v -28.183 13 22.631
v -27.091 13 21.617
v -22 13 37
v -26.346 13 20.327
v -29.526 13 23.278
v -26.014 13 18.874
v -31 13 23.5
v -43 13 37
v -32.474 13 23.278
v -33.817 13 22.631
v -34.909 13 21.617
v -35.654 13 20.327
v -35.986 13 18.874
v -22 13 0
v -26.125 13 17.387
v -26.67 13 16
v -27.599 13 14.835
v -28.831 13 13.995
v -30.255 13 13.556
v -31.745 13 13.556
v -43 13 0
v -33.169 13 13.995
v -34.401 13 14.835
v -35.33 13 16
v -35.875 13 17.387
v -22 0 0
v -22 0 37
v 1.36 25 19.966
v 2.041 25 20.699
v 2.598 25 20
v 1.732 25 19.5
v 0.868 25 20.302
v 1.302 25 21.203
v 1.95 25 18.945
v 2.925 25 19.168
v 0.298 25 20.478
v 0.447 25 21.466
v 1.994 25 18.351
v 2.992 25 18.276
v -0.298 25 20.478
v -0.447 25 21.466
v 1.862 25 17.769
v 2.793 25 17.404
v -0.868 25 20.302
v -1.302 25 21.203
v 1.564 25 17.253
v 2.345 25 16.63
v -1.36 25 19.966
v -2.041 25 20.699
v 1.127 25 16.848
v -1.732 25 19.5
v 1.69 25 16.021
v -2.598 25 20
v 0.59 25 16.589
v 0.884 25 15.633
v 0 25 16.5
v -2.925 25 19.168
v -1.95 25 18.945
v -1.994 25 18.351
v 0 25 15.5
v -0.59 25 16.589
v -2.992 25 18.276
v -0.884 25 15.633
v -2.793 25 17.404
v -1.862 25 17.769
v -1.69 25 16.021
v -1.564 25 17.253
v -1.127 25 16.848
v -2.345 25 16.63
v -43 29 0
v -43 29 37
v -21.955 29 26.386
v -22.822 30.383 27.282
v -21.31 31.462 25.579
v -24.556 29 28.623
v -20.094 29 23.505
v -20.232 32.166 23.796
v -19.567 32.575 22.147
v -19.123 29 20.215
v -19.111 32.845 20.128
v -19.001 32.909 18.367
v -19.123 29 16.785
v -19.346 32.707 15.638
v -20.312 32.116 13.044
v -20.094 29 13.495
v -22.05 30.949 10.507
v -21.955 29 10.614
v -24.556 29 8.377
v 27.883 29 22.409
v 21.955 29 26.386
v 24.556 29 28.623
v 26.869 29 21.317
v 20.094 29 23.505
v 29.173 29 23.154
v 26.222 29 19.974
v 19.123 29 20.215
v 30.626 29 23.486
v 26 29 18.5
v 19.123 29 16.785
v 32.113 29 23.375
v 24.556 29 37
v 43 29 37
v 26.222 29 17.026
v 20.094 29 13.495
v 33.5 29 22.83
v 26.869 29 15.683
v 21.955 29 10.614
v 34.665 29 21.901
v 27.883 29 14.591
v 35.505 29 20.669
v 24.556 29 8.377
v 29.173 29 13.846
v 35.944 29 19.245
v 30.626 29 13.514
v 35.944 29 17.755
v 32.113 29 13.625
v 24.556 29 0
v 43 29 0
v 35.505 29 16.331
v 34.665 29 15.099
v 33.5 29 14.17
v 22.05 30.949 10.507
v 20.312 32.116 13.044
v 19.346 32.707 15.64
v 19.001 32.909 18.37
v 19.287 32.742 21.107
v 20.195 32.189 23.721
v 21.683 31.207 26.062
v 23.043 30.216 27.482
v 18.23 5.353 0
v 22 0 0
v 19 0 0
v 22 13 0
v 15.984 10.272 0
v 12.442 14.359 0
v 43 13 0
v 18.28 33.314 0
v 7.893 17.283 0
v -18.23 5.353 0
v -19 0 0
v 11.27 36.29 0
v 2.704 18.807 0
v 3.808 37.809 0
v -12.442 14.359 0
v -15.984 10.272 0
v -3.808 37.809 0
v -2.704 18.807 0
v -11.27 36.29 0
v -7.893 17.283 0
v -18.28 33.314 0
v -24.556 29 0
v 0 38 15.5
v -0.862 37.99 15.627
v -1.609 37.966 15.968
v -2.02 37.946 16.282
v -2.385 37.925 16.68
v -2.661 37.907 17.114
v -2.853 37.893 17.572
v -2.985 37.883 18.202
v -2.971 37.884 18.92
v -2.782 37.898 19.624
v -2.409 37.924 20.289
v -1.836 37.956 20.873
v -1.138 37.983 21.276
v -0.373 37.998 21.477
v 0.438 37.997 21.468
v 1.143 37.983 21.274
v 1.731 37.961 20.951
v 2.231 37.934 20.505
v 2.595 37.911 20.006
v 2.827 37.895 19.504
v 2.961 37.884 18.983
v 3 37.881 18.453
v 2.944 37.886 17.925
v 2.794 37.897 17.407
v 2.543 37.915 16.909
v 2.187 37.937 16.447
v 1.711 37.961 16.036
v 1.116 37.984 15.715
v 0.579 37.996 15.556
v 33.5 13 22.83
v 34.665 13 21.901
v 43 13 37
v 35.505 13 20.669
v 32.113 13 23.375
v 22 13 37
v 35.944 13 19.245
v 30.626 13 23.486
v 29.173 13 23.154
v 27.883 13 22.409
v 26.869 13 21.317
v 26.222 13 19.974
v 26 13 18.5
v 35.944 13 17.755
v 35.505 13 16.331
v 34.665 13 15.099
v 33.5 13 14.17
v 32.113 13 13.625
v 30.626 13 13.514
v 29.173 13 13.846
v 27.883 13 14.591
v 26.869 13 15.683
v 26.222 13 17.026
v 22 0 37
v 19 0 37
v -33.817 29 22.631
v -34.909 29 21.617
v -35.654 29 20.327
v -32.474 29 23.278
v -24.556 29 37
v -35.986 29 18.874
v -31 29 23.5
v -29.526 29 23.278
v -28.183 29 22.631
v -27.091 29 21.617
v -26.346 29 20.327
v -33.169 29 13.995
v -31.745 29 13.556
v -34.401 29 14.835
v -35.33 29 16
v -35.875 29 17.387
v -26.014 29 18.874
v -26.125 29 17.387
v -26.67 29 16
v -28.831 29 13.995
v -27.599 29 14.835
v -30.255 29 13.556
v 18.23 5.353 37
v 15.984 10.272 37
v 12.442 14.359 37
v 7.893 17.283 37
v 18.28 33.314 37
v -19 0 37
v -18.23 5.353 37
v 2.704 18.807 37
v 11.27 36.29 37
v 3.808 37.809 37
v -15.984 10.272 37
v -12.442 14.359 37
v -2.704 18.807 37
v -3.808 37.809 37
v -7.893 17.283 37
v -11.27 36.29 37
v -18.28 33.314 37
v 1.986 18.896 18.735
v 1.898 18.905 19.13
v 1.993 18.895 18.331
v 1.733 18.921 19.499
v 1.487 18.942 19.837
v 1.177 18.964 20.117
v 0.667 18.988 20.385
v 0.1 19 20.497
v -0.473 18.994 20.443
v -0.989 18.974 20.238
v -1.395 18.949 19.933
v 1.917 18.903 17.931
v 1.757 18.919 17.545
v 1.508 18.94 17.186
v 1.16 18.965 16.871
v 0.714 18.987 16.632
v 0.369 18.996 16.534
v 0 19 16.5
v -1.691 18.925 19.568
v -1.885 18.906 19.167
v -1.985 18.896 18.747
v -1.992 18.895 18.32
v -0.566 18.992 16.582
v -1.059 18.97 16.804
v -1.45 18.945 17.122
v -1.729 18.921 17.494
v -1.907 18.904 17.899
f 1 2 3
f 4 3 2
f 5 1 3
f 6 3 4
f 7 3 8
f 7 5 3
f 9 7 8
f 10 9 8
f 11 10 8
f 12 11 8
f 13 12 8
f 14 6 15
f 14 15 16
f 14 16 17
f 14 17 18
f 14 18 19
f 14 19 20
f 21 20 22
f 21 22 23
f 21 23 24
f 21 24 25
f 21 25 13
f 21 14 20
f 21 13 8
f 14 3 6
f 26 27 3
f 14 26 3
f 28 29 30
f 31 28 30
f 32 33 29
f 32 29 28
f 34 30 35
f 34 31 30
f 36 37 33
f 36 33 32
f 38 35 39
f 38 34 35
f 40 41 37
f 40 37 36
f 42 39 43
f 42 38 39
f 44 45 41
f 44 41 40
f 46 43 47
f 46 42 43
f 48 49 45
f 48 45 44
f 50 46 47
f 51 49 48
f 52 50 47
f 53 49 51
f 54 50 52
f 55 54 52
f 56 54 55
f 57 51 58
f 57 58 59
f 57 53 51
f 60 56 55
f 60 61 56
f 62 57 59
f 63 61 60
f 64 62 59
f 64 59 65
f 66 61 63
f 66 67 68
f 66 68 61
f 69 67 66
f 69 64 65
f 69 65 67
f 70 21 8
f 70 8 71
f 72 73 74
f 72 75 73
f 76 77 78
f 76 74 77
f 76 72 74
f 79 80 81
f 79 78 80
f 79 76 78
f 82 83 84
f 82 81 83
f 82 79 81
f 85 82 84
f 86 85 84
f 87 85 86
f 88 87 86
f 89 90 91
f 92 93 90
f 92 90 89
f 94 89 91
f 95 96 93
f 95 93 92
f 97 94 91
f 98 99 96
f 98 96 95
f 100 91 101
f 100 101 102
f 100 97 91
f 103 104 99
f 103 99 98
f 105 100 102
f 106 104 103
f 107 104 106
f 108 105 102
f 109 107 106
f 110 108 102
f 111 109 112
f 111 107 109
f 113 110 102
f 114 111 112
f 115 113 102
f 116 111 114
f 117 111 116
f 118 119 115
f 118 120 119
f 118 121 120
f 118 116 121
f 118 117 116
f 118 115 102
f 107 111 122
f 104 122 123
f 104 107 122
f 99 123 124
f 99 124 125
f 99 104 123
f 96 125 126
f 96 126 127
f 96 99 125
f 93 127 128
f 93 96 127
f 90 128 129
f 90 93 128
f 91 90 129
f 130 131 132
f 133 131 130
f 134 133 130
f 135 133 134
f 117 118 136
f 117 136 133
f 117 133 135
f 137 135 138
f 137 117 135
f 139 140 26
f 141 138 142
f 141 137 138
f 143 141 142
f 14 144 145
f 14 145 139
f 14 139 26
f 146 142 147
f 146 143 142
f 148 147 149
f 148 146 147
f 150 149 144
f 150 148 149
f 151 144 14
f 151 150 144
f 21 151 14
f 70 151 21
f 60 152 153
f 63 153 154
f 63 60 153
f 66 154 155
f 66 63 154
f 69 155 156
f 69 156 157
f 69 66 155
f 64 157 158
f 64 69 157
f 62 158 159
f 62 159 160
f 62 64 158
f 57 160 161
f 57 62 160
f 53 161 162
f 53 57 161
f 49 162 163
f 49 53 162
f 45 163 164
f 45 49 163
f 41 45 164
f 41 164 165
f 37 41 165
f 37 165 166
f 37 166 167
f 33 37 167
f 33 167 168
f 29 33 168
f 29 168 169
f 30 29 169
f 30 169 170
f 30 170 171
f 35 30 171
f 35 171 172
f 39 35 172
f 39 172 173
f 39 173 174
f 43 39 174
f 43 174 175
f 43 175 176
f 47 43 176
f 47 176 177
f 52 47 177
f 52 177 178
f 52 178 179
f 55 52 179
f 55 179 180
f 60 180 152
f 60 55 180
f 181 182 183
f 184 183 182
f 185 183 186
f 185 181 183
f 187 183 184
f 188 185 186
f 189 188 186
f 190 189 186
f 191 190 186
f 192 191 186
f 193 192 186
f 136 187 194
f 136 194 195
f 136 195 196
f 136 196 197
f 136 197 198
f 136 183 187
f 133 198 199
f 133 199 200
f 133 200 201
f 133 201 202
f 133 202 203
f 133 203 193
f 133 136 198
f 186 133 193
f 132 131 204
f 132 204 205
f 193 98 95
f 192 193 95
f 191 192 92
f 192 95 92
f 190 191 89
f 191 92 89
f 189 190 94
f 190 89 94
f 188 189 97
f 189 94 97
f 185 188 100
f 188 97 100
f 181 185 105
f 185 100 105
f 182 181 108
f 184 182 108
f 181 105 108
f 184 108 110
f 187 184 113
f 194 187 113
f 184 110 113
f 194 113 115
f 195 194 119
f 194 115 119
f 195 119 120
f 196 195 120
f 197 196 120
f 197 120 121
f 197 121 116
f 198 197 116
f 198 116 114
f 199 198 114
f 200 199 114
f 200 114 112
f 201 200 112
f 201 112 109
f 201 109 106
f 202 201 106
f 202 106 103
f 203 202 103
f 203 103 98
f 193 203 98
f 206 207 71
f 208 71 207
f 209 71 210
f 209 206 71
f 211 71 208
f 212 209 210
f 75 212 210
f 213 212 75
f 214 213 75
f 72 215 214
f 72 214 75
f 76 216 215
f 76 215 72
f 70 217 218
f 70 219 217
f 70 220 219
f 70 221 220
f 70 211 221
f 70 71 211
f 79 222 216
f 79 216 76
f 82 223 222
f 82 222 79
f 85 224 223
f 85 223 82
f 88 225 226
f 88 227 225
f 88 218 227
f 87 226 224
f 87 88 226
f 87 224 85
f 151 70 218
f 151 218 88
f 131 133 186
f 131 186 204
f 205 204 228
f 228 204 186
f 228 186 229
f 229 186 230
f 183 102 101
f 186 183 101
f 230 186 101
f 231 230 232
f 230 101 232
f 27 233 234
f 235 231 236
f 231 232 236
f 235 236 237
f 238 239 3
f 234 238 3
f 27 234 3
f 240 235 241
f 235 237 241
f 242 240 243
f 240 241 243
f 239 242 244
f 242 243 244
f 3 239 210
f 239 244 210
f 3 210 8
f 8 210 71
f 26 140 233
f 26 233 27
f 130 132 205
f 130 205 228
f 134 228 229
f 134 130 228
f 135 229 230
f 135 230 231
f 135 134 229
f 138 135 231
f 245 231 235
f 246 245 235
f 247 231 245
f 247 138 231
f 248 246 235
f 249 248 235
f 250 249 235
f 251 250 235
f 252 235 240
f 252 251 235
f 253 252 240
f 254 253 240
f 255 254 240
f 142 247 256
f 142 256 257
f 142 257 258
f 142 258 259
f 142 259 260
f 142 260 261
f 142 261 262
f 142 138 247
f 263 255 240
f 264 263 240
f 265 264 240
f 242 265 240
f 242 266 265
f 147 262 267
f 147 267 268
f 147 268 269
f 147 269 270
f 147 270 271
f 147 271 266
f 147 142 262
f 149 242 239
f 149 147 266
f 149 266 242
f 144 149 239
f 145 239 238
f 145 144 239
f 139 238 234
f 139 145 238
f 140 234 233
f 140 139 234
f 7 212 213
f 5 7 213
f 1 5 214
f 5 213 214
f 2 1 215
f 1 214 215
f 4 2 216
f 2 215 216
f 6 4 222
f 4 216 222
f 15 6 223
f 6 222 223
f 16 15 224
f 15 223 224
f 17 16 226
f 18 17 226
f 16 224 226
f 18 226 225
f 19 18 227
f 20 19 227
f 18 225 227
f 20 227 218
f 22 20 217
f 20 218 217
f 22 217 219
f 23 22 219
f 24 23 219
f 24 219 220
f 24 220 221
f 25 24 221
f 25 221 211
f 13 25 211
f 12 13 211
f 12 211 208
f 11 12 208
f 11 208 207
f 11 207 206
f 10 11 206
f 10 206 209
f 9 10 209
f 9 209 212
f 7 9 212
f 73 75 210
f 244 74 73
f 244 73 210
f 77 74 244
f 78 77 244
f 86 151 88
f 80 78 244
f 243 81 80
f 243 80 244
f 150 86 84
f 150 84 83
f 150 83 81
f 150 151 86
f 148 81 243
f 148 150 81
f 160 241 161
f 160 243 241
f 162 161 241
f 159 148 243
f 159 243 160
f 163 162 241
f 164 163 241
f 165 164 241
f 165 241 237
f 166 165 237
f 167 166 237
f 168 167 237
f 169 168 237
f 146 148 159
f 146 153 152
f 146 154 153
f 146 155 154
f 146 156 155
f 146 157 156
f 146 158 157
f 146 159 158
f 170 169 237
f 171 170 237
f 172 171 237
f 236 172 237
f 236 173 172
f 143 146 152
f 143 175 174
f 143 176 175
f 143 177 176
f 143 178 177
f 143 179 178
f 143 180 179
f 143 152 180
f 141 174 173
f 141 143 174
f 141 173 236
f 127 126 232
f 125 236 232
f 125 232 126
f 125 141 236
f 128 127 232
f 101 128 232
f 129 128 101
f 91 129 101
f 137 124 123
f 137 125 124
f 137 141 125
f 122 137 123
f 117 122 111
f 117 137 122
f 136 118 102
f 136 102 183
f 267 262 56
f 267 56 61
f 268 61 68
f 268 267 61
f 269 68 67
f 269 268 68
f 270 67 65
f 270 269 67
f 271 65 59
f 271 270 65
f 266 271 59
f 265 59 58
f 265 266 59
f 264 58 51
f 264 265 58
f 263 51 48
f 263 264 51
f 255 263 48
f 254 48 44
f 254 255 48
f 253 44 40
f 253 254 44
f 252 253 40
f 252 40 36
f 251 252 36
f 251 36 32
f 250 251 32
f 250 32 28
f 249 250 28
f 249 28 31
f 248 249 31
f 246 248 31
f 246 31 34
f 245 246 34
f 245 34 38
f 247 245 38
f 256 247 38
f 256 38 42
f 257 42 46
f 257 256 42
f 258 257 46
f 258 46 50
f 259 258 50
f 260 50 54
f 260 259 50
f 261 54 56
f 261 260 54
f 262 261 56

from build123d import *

# Parameters (mm, degrees)
BOSS_EXTRUDE1_DEPTH = 37
SKETCH3_R           = 5
CUT_EXTRUDE1_DEPTH  = 37
SKETCH4_R           = 12
CUT_EXTRUDE2_DEPTH  = 12
SKETCH5_R           = 2
CUT_EXTRUDE3_DEPTH  = 50
SKETCH6_R           = 3
CUT_EXTRUDE4_DEPTH  = 29


with BuildPart() as part:
    # Sketch1 → Boss-Extrude1 (new body)
    with BuildSketch(Plane.XY):
        with BuildLine():
            Line((-19, 0), (-22, 0))
            Line((-22, 0), (-22, 13))
            Line((-22, 13), (-43, 13))
            Line((-43, 13), (-43, 29))
            Line((-43, 29), (-24.556058316, 29))
            ThreePointArc((-24.556058316, 29), (0, 38), (24.556058316, 29))
            Line((24.556058316, 29), (43, 29))
            Line((43, 29), (43, 13))
            Line((43, 13), (22, 13))
            Line((22, 13), (22, 0))
            Line((22, 0), (19, 0))
            ThreePointArc((19, 0), (0, 19), (-19, 0))
        make_face()
    extrude(amount=BOSS_EXTRUDE1_DEPTH)

    # Sketch3 → Cut-Extrude1 (cut)
    with BuildSketch(Plane(origin=(0, 29, 0), x_dir=(1, 0, 0), z_dir=(0, 1, 0))):
        with Locations(Location((-31, -18.5, 0), (0, 0, 270))):
            Circle(SKETCH3_R)
        with Locations(Location((31, -18.5, 0), (0, 0, 180))):
            Circle(SKETCH3_R)
    extrude(amount=-CUT_EXTRUDE1_DEPTH, mode=Mode.SUBTRACT)

    # Sketch4 → Cut-Extrude2 (cut)
    with BuildSketch(Plane(origin=(0, 29, 0), x_dir=(1, 0, 0), z_dir=(0, 1, 0))):
        with Locations((-31, -18.5)):
            Circle(SKETCH4_R)
        with Locations((31, -18.5)):
            Circle(SKETCH4_R)
    extrude(amount=CUT_EXTRUDE2_DEPTH, mode=Mode.SUBTRACT)

    # Sketch5 → Cut-Extrude3 (cut)
    with BuildSketch(Plane(origin=(0, 0, 0), x_dir=(1, 0, 0), z_dir=(0, 1, 0))):
        with Locations(Location((0, -18.5, 0), (0, 0, 90))):
            Circle(SKETCH5_R)
    extrude(amount=CUT_EXTRUDE3_DEPTH, mode=Mode.SUBTRACT)

    # Sketch6 → Cut-Extrude4 (cut)
    with BuildSketch(Plane(origin=(0, 25, 0), x_dir=(1, 0, 0), z_dir=(0, 1, 0))):
        with Locations(Location((0, -18.5, 0), (0, 0, 90))):
            Circle(SKETCH6_R)
    extrude(amount=CUT_EXTRUDE4_DEPTH, mode=Mode.SUBTRACT)


solid = part.part
